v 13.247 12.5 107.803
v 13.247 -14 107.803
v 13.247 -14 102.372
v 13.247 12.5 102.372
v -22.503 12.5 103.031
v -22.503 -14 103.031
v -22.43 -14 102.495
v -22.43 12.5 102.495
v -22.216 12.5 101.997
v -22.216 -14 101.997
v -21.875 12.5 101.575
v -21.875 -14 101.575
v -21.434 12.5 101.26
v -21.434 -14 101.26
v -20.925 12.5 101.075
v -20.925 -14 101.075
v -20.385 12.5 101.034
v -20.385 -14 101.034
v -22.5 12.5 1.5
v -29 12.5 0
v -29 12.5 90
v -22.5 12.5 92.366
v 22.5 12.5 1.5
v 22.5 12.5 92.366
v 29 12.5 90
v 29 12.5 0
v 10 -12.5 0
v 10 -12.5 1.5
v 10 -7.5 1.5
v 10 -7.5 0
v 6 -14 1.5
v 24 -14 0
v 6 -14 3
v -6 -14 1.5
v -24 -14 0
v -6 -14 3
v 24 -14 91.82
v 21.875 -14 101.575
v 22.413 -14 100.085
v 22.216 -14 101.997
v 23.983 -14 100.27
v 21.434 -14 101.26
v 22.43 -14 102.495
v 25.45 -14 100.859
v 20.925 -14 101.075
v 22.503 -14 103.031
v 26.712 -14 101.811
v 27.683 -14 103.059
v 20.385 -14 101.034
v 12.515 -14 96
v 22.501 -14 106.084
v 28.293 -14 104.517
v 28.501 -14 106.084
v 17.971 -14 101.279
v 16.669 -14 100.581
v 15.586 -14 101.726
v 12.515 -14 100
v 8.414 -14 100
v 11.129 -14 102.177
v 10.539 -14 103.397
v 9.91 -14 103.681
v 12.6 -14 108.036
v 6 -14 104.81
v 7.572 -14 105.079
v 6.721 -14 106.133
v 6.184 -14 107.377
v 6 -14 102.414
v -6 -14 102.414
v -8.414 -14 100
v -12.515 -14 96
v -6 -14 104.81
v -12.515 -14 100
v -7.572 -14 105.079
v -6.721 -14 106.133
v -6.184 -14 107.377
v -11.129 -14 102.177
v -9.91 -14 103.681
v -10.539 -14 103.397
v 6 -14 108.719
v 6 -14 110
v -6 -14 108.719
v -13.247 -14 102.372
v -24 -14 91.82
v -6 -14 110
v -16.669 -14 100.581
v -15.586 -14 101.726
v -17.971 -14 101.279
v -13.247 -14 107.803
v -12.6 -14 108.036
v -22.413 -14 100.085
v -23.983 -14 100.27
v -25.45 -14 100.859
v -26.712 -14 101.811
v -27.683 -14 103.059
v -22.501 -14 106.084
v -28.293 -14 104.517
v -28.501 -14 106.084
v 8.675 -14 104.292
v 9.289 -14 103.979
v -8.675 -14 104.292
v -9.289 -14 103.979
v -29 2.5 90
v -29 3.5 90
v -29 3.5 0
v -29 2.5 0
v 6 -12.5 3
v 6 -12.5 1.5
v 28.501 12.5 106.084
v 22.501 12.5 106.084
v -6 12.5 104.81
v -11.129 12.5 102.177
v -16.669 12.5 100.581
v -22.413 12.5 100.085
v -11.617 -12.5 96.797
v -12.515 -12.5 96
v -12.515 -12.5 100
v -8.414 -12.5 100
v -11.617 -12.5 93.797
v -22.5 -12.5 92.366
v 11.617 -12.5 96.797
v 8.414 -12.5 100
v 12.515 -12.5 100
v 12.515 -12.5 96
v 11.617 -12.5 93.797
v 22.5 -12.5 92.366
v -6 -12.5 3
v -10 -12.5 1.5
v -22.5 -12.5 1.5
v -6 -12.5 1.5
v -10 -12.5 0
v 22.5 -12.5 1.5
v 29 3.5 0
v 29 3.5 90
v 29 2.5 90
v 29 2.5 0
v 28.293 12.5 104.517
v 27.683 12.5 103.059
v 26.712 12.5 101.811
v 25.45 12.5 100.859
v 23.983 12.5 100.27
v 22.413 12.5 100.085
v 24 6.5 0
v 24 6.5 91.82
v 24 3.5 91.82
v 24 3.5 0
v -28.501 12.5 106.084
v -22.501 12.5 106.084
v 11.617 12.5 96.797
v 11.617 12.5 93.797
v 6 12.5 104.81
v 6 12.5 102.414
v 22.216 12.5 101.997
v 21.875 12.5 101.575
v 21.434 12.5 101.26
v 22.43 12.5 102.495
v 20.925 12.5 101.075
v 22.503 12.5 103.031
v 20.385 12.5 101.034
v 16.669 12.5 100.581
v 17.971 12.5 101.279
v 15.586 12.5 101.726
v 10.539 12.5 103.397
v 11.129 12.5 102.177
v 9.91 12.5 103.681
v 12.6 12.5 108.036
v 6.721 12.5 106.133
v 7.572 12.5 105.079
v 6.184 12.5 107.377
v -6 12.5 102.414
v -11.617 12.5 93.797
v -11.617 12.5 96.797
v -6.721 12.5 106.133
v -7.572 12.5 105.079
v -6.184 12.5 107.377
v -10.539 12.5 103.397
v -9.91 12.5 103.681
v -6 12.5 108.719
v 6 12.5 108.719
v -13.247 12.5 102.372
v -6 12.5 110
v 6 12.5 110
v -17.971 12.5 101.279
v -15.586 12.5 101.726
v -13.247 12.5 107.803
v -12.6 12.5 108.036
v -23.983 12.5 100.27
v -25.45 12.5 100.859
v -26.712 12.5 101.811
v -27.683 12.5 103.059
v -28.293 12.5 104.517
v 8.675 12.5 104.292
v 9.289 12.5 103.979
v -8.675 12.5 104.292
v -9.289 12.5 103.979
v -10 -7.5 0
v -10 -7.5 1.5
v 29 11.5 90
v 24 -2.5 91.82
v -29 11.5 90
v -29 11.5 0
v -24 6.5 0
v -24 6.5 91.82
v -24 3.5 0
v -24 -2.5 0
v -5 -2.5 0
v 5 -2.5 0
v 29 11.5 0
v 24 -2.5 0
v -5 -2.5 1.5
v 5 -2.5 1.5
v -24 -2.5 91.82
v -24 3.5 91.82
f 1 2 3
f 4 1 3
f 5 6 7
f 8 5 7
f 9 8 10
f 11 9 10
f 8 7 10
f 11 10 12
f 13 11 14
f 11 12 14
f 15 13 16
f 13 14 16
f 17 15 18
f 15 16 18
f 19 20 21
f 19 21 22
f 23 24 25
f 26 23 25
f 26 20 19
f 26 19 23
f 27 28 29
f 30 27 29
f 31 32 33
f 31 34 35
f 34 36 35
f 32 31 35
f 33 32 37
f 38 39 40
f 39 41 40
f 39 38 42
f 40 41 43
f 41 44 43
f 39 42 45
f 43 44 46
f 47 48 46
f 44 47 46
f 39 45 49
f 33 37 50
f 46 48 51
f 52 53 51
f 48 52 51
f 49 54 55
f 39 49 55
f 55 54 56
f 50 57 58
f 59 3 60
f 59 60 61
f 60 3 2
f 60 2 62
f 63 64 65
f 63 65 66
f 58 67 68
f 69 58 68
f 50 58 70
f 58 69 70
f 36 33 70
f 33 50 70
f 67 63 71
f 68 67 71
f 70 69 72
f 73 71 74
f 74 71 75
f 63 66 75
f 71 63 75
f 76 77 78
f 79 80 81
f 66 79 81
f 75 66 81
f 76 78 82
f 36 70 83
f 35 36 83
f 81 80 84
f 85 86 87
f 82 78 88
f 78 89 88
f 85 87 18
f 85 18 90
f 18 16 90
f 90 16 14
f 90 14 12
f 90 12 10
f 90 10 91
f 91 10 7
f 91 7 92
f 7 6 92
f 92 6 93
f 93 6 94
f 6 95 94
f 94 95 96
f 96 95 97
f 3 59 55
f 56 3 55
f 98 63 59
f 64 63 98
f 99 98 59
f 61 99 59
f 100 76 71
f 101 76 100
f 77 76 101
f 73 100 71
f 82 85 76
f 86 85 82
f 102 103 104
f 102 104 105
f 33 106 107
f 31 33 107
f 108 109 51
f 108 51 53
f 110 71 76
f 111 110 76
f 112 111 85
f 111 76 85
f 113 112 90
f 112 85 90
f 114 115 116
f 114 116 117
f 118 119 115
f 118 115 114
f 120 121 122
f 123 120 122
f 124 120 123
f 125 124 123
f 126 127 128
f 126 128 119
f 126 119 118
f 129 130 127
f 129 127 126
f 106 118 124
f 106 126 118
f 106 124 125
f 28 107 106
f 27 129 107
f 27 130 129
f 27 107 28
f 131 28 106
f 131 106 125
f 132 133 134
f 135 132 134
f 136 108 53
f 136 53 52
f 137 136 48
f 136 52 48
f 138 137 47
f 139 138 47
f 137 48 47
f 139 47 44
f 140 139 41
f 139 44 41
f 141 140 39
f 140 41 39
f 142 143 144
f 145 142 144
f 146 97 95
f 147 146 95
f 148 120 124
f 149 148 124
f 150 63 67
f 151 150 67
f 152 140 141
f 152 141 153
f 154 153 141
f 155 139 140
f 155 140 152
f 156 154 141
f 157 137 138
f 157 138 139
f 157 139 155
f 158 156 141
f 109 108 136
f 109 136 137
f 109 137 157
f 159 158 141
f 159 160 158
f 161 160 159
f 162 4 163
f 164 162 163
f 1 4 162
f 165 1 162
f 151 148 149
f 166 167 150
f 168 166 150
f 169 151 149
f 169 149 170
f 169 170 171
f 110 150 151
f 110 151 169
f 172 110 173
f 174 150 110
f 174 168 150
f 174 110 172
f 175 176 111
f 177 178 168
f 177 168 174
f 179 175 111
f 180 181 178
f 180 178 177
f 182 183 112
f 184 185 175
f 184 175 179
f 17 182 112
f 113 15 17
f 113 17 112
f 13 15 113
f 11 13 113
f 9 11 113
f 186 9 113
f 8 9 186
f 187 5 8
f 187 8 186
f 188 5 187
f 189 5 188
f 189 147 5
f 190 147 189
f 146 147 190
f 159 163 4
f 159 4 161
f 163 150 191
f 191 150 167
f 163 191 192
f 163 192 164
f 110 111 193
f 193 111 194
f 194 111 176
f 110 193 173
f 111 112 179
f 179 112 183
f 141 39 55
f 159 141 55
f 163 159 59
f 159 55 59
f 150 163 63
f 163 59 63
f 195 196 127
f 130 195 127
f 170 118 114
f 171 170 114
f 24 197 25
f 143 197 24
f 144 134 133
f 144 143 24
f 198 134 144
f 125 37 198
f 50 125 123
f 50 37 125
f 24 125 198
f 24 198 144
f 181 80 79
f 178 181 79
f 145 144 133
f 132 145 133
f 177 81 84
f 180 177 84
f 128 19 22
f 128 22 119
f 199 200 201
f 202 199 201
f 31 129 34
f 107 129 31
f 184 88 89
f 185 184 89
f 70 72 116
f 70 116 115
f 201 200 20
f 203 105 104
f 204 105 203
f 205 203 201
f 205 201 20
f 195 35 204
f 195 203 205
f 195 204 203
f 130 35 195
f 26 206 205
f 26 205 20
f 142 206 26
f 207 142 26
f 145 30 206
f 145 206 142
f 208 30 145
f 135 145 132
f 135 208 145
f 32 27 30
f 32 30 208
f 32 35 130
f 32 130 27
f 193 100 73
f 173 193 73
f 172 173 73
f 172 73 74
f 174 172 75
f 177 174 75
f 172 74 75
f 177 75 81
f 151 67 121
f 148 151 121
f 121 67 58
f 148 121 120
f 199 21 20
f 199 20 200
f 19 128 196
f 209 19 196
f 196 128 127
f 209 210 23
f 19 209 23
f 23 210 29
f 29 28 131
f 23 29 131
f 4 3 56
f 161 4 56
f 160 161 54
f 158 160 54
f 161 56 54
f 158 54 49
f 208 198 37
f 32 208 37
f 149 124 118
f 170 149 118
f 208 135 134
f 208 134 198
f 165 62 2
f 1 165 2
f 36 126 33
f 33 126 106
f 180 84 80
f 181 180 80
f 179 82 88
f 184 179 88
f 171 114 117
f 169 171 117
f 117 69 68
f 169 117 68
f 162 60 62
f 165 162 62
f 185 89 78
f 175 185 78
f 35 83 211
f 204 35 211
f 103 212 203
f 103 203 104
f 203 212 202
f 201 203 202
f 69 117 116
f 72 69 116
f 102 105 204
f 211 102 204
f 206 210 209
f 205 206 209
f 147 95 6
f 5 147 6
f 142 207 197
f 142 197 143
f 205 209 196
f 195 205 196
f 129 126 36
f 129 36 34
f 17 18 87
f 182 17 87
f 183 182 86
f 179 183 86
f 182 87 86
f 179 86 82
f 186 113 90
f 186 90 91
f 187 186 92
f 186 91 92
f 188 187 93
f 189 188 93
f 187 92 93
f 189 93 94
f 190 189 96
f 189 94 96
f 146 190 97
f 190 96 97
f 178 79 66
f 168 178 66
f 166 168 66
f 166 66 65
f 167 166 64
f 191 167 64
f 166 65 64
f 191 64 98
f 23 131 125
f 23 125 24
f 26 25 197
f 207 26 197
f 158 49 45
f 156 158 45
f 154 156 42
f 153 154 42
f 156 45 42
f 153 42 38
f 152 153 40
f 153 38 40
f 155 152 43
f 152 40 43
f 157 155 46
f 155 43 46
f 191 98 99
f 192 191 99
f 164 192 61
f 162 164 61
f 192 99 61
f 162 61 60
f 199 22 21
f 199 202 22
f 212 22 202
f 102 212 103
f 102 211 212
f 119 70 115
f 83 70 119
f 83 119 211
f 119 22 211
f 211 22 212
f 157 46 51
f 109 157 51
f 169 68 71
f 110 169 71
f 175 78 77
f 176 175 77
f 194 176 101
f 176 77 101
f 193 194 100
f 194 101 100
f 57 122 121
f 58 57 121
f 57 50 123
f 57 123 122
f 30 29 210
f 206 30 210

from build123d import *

# Parameters (mm, degrees)
RESSALTO_EXTRUS_O1_DEPTH  = 100
RESSALTO_EXTRUS_O2_DEPTH  = 100
ESBO_O3_W                 = 45
ESBO_O3_H                 = 1.5
RESSALTO_EXTRUS_O3_DEPTH  = 25
CORTE_EXTRUS_O1_DEPTH     = 104.630352696
ESBO_O5_W                 = 12
ESBO_O5_H                 = 1.5
CORTE_EXTRUS_O2_DEPTH     = 108.079409785
CORTE_EXTRUS_O3_DEPTH     = 108.439517869
RESSALTO_EXTRUS_O10_DEPTH = 26.5


with BuildPart() as part:
    # Esboço1 → Ressalto-extrusão1 (new body)
    with BuildSketch(Plane.XY):
        Polygon((-22.5, 12.5), (-22.5, -12.5), (22.5, -12.5), (22.5, 12.5), (24, 12.5), (24, -14), (-24, -14), (-24, 12.5), align=None)
    extrude(amount=RESSALTO_EXTRUS_O1_DEPTH)

    # Esboço2 → Ressalto-extrusão2 (add)
    with BuildSketch(Plane(origin=(0, 0, 0), x_dir=(-1, 0, 0), z_dir=(0, 0, -1))):
        Polygon((-24, 12.5), (-29, 12.5), (-29, 11.5), (-24, 6.5), align=None)
        Polygon((-24, 3.5), (-29, 3.5), (-29, 2.5), (-24, -2.5), align=None)
        Polygon((29, 3.5), (29, 2.5), (24, -2.5), (24, 3.5), align=None)
        Polygon((29, 12.5), (29, 11.5), (24, 6.5), (24, 12.5), align=None)
    extrude(amount=-RESSALTO_EXTRUS_O2_DEPTH)

    # Esboço3 → Ressalto-extrusão3 (add)
    with BuildSketch(Plane(origin=(0, -12.5, 0), x_dir=(1, 0, 0), z_dir=(0, 1, 0))):
        with Locations((0, -0.75)):
            Rectangle(ESBO_O3_W, ESBO_O3_H)
    extrude(amount=RESSALTO_EXTRUS_O3_DEPTH)

    # Esboço4 → Corte-extrusão1 (cut, through all)
    with BuildSketch(Plane.XY.offset(1.5)):
        Polygon((-10, -12.5), (10, -12.5), (10, -7.5), (5, -2.5), (-5, -2.5), (-10, -7.5), align=None)
    extrude(amount=-CORTE_EXTRUS_O1_DEPTH, mode=Mode.SUBTRACT)

    # Esboço5 → Corte-extrusão2 (cut, through all)
    with BuildSketch(Plane(origin=(0, -12.5, 0), x_dir=(1, 0, 0), z_dir=(0, 1, 0))):
        with Locations((0, -2.25)):
            Rectangle(ESBO_O5_W, ESBO_O5_H)
    extrude(amount=-CORTE_EXTRUS_O2_DEPTH, mode=Mode.SUBTRACT)

    # Esboço9 → Corte-extrusão3 (cut, through all)
    with BuildSketch(Plane.XZ.offset(14)):
        Polygon((-12.515135483, 96), (-29, 90), (-29, 100), (-12.515135483, 100), align=None)
        Polygon((29, 100), (29, 90), (12.515135483, 96), (12.515135483, 100), align=None)
    extrude(amount=-CORTE_EXTRUS_O3_DEPTH, mode=Mode.SUBTRACT)

    # Esboço6 → Ressalto-extrusão10 (add, through all)
    with BuildSketch(Plane.XZ.offset(14)):
        with BuildLine():
            Line((-6, 110), (6, 110))
            Line((6, 110), (6, 108.718795841))
            ThreePointArc((6, 108.718795841), (6.720673479, 106.132801926), (8.674945811, 104.292270904))
            ThreePointArc((8.674945811, 104.292270904), (9.598817012, 103.827932437), (10.538733862, 103.396997961))
            Line((10.538733862, 103.396997961), (12.600450366, 108.0363228))
            Line((12.600450366, 108.0363228), (13.247345381, 107.802907073))
            Line((13.247345381, 107.802907073), (13.247345381, 102.372045387))
            ThreePointArc((13.247345381, 102.372045387), (16.773859685, 101.477410085), (20.384927381, 101.033714749))
            ThreePointArc((20.384927381, 101.033714749), (21.87541452, 101.575227938), (22.50318548, 103.031487553))
            Line((22.50318548, 103.031487553), (22.501243671, 106.084324825))
            Line((22.501243671, 106.084324825), (28.501243671, 106.084324825))
            ThreePointArc((28.501243671, 106.084324825), (26.712485124, 101.810515585), (22.412761864, 100.08497728))
            ThreePointArc((22.412761864, 100.08497728), (13.860011295, 101.244470296), (6, 104.810166412))
            Line((6, 104.810166412), (6, 102.41442124))
            Line((6, 102.41442124), (11.616924727, 96.797496513))
            Line((11.616924727, 96.797496513), (11.616924727, 93.797496513))
            Line((11.616924727, 93.797496513), (-11.616924727, 93.797496513))
            Line((-11.616924727, 93.797496513), (-11.616924727, 96.797496513))
            Line((-11.616924727, 96.797496513), (-6, 102.41442124))
            Line((-6, 102.41442124), (-6, 104.810166412))
            ThreePointArc((-6, 104.810166412), (-13.860011295, 101.244470296), (-22.412761864, 100.08497728))
            ThreePointArc((-22.412761864, 100.08497728), (-26.712485124, 101.810515585), (-28.501243671, 106.084324825))
            Line((-28.501243671, 106.084324825), (-22.501243671, 106.084324825))
            Line((-22.501243671, 106.084324825), (-22.50318548, 103.031487553))
            ThreePointArc((-22.50318548, 103.031487553), (-21.87541452, 101.575227938), (-20.384927381, 101.033714749))
            ThreePointArc((-20.384927381, 101.033714749), (-16.773859685, 101.477410085), (-13.247345381, 102.372045387))
            Line((-13.247345381, 102.372045387), (-13.247345381, 107.802907073))
            Line((-13.247345381, 107.802907073), (-12.600450366, 108.0363228))
            Line((-12.600450366, 108.0363228), (-10.538733862, 103.396997961))
            ThreePointArc((-10.538733862, 103.396997961), (-9.598817012, 103.827932437), (-8.674945811, 104.292270904))
            ThreePointArc((-8.674945811, 104.292270904), (-6.720673479, 106.132801926), (-6, 108.718795841))
            Line((-6, 108.718795841), (-6, 110))
        make_face()
    extrude(amount=-RESSALTO_EXTRUS_O10_DEPTH)


solid = part.part
